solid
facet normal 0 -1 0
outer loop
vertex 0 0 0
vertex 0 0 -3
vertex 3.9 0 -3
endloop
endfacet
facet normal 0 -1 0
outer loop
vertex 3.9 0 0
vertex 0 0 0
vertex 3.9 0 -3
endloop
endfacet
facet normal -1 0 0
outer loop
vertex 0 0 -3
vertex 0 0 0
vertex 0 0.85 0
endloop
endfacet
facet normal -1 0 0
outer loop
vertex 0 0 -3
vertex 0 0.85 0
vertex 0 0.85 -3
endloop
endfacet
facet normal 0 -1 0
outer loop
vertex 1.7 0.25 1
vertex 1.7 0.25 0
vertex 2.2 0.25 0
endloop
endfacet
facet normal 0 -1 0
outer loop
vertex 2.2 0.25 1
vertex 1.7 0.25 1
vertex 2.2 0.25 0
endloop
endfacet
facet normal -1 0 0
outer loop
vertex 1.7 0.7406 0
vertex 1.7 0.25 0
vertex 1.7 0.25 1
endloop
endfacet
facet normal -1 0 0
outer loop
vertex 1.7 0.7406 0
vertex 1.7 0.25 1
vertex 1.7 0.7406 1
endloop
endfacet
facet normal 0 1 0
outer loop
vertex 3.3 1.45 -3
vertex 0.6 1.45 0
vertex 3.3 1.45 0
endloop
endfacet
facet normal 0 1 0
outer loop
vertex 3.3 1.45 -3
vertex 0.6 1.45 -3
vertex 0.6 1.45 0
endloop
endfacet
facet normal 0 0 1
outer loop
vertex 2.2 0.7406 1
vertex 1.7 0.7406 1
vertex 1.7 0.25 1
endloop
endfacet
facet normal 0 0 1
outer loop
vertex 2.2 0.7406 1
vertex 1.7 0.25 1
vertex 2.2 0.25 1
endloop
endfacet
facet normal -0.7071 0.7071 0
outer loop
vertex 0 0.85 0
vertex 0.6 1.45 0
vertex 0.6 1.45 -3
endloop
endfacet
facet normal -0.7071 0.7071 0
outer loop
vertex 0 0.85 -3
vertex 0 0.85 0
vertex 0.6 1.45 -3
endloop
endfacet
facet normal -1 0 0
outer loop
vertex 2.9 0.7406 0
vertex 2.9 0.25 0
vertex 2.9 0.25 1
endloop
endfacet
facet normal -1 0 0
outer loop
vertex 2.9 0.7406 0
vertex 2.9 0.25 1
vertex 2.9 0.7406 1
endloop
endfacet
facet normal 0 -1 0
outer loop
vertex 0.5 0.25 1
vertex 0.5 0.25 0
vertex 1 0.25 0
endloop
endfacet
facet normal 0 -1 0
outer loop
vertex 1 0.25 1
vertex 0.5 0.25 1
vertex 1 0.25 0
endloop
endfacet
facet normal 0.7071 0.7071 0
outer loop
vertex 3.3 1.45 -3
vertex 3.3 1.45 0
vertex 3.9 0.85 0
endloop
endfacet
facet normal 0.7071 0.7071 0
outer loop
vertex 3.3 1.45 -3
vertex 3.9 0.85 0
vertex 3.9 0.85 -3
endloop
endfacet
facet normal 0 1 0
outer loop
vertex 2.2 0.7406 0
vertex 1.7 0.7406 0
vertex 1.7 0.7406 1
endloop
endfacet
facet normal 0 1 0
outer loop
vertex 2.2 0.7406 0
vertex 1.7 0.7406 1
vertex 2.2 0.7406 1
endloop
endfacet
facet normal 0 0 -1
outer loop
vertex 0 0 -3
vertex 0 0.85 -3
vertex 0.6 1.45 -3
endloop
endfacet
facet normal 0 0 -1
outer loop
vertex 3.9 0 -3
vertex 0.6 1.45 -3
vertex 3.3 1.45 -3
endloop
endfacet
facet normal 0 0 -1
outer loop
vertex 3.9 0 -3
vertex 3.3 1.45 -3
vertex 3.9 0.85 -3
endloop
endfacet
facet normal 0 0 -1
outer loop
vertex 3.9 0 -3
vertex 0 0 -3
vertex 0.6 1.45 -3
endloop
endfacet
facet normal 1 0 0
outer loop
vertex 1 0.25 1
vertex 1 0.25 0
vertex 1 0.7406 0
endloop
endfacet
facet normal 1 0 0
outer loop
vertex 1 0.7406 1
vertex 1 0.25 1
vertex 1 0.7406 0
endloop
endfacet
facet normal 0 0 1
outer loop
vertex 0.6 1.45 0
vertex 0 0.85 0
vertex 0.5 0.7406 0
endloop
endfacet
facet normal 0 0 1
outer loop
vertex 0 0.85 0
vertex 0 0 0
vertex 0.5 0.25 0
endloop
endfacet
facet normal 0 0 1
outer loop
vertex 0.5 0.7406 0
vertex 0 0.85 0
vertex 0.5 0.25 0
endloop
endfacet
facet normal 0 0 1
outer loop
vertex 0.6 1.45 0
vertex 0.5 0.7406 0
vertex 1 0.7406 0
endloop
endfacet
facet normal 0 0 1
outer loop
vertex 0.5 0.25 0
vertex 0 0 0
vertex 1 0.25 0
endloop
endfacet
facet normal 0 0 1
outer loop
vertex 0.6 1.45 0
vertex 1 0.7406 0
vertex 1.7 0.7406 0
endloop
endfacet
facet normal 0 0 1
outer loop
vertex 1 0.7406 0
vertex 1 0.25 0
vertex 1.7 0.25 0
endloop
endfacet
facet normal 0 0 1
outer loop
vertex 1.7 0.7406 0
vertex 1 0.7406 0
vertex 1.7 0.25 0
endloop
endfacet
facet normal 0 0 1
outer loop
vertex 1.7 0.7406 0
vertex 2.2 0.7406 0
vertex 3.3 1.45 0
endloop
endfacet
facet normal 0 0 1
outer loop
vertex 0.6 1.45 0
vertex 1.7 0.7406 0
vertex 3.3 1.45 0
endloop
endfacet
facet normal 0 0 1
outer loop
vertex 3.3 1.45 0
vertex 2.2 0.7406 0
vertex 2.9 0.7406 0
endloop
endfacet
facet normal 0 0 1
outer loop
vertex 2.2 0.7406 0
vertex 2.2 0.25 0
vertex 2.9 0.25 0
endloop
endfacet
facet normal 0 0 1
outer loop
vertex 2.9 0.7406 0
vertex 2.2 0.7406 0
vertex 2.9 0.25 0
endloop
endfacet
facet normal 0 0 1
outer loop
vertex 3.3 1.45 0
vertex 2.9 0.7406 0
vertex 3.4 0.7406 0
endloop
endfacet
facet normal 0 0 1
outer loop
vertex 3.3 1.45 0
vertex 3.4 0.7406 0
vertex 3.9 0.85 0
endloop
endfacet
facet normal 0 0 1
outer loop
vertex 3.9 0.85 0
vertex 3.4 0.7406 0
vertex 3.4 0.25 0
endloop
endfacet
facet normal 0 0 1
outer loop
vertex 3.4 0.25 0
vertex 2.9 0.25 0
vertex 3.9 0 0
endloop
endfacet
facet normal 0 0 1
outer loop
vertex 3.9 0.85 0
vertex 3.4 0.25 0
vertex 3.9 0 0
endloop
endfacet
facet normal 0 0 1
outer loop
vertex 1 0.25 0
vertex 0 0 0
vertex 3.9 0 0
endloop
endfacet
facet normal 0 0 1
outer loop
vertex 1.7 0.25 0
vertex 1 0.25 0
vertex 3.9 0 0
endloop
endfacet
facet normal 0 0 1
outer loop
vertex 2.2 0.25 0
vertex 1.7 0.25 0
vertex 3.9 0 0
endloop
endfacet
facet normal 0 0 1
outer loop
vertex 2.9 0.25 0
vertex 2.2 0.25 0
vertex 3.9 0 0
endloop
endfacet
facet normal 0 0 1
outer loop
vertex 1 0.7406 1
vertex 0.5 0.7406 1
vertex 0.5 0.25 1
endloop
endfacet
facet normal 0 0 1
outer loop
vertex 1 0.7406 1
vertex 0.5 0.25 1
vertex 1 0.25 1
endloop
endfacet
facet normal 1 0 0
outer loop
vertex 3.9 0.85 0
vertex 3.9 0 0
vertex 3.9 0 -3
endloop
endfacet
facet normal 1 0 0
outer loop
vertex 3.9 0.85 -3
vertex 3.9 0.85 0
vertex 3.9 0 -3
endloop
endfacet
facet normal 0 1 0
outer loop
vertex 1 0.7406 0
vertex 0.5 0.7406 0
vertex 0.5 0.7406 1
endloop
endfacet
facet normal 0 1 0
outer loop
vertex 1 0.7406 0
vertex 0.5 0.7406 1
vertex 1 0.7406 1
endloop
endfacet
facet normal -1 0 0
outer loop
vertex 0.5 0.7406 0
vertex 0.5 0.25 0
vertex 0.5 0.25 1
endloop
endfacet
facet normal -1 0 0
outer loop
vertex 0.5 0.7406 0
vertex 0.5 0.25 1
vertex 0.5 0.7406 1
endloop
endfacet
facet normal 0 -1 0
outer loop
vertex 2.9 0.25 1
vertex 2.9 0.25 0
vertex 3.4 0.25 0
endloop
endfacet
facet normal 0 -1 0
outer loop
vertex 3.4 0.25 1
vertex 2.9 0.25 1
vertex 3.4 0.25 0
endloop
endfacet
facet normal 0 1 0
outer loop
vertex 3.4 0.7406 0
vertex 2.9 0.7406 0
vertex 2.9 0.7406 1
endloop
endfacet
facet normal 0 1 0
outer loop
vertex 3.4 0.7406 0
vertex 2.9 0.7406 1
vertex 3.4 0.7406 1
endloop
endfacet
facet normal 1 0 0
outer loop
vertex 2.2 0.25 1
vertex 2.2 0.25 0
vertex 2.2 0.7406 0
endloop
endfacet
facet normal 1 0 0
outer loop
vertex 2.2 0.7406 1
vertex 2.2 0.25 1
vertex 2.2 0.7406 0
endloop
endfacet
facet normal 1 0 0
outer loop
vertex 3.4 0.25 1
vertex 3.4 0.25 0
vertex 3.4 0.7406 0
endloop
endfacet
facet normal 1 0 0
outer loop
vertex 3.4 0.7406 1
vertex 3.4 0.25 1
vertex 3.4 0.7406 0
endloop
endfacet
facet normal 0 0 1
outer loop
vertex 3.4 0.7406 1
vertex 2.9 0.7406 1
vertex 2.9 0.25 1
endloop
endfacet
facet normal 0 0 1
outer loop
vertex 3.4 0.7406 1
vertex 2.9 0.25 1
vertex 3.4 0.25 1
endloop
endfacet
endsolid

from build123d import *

# Parameters (mm, degrees)
SKETCH1_W           = 3.9
SKETCH1_H           = 3
BOSS_EXTRUDE1_DEPTH = 1.45
CHAMFER1_SIZE       = 0.6
SKETCH2_W           = 0.5
SKETCH2_H           = 0.490574161
BOSS_EXTRUDE2_DEPTH = 1


with BuildPart() as part:
    # Sketch1 → Boss-Extrude1 (new body)
    with BuildSketch(Plane(origin=(0, 0, 0), x_dir=(1, 0, 0), z_dir=(0, 1, 0))):
        with Locations((1.95, 1.5)):
            Rectangle(SKETCH1_W, SKETCH1_H)
    extrude(amount=BOSS_EXTRUDE1_DEPTH)

    # Chamfer1
    chamfer1_edges = [part.edges().sort_by_distance(p)[0] for p in [
        (3.9, 1.45, -1.5),
        (0, 1.45, -1.5),
    ]]
    chamfer(chamfer1_edges, length=CHAMFER1_SIZE)

    # Sketch2 → Boss-Extrude2 (add)
    with BuildSketch(Plane.XY):
        with Locations((0.75, 0.495287081)):
            Rectangle(SKETCH2_W, SKETCH2_H)
        with Locations((1.95, 0.495287081)):
            Rectangle(SKETCH2_W, SKETCH2_H)
        with Locations((3.15, 0.495287081)):
            Rectangle(SKETCH2_W, SKETCH2_H)
    extrude(amount=BOSS_EXTRUDE2_DEPTH)


solid = part.part
